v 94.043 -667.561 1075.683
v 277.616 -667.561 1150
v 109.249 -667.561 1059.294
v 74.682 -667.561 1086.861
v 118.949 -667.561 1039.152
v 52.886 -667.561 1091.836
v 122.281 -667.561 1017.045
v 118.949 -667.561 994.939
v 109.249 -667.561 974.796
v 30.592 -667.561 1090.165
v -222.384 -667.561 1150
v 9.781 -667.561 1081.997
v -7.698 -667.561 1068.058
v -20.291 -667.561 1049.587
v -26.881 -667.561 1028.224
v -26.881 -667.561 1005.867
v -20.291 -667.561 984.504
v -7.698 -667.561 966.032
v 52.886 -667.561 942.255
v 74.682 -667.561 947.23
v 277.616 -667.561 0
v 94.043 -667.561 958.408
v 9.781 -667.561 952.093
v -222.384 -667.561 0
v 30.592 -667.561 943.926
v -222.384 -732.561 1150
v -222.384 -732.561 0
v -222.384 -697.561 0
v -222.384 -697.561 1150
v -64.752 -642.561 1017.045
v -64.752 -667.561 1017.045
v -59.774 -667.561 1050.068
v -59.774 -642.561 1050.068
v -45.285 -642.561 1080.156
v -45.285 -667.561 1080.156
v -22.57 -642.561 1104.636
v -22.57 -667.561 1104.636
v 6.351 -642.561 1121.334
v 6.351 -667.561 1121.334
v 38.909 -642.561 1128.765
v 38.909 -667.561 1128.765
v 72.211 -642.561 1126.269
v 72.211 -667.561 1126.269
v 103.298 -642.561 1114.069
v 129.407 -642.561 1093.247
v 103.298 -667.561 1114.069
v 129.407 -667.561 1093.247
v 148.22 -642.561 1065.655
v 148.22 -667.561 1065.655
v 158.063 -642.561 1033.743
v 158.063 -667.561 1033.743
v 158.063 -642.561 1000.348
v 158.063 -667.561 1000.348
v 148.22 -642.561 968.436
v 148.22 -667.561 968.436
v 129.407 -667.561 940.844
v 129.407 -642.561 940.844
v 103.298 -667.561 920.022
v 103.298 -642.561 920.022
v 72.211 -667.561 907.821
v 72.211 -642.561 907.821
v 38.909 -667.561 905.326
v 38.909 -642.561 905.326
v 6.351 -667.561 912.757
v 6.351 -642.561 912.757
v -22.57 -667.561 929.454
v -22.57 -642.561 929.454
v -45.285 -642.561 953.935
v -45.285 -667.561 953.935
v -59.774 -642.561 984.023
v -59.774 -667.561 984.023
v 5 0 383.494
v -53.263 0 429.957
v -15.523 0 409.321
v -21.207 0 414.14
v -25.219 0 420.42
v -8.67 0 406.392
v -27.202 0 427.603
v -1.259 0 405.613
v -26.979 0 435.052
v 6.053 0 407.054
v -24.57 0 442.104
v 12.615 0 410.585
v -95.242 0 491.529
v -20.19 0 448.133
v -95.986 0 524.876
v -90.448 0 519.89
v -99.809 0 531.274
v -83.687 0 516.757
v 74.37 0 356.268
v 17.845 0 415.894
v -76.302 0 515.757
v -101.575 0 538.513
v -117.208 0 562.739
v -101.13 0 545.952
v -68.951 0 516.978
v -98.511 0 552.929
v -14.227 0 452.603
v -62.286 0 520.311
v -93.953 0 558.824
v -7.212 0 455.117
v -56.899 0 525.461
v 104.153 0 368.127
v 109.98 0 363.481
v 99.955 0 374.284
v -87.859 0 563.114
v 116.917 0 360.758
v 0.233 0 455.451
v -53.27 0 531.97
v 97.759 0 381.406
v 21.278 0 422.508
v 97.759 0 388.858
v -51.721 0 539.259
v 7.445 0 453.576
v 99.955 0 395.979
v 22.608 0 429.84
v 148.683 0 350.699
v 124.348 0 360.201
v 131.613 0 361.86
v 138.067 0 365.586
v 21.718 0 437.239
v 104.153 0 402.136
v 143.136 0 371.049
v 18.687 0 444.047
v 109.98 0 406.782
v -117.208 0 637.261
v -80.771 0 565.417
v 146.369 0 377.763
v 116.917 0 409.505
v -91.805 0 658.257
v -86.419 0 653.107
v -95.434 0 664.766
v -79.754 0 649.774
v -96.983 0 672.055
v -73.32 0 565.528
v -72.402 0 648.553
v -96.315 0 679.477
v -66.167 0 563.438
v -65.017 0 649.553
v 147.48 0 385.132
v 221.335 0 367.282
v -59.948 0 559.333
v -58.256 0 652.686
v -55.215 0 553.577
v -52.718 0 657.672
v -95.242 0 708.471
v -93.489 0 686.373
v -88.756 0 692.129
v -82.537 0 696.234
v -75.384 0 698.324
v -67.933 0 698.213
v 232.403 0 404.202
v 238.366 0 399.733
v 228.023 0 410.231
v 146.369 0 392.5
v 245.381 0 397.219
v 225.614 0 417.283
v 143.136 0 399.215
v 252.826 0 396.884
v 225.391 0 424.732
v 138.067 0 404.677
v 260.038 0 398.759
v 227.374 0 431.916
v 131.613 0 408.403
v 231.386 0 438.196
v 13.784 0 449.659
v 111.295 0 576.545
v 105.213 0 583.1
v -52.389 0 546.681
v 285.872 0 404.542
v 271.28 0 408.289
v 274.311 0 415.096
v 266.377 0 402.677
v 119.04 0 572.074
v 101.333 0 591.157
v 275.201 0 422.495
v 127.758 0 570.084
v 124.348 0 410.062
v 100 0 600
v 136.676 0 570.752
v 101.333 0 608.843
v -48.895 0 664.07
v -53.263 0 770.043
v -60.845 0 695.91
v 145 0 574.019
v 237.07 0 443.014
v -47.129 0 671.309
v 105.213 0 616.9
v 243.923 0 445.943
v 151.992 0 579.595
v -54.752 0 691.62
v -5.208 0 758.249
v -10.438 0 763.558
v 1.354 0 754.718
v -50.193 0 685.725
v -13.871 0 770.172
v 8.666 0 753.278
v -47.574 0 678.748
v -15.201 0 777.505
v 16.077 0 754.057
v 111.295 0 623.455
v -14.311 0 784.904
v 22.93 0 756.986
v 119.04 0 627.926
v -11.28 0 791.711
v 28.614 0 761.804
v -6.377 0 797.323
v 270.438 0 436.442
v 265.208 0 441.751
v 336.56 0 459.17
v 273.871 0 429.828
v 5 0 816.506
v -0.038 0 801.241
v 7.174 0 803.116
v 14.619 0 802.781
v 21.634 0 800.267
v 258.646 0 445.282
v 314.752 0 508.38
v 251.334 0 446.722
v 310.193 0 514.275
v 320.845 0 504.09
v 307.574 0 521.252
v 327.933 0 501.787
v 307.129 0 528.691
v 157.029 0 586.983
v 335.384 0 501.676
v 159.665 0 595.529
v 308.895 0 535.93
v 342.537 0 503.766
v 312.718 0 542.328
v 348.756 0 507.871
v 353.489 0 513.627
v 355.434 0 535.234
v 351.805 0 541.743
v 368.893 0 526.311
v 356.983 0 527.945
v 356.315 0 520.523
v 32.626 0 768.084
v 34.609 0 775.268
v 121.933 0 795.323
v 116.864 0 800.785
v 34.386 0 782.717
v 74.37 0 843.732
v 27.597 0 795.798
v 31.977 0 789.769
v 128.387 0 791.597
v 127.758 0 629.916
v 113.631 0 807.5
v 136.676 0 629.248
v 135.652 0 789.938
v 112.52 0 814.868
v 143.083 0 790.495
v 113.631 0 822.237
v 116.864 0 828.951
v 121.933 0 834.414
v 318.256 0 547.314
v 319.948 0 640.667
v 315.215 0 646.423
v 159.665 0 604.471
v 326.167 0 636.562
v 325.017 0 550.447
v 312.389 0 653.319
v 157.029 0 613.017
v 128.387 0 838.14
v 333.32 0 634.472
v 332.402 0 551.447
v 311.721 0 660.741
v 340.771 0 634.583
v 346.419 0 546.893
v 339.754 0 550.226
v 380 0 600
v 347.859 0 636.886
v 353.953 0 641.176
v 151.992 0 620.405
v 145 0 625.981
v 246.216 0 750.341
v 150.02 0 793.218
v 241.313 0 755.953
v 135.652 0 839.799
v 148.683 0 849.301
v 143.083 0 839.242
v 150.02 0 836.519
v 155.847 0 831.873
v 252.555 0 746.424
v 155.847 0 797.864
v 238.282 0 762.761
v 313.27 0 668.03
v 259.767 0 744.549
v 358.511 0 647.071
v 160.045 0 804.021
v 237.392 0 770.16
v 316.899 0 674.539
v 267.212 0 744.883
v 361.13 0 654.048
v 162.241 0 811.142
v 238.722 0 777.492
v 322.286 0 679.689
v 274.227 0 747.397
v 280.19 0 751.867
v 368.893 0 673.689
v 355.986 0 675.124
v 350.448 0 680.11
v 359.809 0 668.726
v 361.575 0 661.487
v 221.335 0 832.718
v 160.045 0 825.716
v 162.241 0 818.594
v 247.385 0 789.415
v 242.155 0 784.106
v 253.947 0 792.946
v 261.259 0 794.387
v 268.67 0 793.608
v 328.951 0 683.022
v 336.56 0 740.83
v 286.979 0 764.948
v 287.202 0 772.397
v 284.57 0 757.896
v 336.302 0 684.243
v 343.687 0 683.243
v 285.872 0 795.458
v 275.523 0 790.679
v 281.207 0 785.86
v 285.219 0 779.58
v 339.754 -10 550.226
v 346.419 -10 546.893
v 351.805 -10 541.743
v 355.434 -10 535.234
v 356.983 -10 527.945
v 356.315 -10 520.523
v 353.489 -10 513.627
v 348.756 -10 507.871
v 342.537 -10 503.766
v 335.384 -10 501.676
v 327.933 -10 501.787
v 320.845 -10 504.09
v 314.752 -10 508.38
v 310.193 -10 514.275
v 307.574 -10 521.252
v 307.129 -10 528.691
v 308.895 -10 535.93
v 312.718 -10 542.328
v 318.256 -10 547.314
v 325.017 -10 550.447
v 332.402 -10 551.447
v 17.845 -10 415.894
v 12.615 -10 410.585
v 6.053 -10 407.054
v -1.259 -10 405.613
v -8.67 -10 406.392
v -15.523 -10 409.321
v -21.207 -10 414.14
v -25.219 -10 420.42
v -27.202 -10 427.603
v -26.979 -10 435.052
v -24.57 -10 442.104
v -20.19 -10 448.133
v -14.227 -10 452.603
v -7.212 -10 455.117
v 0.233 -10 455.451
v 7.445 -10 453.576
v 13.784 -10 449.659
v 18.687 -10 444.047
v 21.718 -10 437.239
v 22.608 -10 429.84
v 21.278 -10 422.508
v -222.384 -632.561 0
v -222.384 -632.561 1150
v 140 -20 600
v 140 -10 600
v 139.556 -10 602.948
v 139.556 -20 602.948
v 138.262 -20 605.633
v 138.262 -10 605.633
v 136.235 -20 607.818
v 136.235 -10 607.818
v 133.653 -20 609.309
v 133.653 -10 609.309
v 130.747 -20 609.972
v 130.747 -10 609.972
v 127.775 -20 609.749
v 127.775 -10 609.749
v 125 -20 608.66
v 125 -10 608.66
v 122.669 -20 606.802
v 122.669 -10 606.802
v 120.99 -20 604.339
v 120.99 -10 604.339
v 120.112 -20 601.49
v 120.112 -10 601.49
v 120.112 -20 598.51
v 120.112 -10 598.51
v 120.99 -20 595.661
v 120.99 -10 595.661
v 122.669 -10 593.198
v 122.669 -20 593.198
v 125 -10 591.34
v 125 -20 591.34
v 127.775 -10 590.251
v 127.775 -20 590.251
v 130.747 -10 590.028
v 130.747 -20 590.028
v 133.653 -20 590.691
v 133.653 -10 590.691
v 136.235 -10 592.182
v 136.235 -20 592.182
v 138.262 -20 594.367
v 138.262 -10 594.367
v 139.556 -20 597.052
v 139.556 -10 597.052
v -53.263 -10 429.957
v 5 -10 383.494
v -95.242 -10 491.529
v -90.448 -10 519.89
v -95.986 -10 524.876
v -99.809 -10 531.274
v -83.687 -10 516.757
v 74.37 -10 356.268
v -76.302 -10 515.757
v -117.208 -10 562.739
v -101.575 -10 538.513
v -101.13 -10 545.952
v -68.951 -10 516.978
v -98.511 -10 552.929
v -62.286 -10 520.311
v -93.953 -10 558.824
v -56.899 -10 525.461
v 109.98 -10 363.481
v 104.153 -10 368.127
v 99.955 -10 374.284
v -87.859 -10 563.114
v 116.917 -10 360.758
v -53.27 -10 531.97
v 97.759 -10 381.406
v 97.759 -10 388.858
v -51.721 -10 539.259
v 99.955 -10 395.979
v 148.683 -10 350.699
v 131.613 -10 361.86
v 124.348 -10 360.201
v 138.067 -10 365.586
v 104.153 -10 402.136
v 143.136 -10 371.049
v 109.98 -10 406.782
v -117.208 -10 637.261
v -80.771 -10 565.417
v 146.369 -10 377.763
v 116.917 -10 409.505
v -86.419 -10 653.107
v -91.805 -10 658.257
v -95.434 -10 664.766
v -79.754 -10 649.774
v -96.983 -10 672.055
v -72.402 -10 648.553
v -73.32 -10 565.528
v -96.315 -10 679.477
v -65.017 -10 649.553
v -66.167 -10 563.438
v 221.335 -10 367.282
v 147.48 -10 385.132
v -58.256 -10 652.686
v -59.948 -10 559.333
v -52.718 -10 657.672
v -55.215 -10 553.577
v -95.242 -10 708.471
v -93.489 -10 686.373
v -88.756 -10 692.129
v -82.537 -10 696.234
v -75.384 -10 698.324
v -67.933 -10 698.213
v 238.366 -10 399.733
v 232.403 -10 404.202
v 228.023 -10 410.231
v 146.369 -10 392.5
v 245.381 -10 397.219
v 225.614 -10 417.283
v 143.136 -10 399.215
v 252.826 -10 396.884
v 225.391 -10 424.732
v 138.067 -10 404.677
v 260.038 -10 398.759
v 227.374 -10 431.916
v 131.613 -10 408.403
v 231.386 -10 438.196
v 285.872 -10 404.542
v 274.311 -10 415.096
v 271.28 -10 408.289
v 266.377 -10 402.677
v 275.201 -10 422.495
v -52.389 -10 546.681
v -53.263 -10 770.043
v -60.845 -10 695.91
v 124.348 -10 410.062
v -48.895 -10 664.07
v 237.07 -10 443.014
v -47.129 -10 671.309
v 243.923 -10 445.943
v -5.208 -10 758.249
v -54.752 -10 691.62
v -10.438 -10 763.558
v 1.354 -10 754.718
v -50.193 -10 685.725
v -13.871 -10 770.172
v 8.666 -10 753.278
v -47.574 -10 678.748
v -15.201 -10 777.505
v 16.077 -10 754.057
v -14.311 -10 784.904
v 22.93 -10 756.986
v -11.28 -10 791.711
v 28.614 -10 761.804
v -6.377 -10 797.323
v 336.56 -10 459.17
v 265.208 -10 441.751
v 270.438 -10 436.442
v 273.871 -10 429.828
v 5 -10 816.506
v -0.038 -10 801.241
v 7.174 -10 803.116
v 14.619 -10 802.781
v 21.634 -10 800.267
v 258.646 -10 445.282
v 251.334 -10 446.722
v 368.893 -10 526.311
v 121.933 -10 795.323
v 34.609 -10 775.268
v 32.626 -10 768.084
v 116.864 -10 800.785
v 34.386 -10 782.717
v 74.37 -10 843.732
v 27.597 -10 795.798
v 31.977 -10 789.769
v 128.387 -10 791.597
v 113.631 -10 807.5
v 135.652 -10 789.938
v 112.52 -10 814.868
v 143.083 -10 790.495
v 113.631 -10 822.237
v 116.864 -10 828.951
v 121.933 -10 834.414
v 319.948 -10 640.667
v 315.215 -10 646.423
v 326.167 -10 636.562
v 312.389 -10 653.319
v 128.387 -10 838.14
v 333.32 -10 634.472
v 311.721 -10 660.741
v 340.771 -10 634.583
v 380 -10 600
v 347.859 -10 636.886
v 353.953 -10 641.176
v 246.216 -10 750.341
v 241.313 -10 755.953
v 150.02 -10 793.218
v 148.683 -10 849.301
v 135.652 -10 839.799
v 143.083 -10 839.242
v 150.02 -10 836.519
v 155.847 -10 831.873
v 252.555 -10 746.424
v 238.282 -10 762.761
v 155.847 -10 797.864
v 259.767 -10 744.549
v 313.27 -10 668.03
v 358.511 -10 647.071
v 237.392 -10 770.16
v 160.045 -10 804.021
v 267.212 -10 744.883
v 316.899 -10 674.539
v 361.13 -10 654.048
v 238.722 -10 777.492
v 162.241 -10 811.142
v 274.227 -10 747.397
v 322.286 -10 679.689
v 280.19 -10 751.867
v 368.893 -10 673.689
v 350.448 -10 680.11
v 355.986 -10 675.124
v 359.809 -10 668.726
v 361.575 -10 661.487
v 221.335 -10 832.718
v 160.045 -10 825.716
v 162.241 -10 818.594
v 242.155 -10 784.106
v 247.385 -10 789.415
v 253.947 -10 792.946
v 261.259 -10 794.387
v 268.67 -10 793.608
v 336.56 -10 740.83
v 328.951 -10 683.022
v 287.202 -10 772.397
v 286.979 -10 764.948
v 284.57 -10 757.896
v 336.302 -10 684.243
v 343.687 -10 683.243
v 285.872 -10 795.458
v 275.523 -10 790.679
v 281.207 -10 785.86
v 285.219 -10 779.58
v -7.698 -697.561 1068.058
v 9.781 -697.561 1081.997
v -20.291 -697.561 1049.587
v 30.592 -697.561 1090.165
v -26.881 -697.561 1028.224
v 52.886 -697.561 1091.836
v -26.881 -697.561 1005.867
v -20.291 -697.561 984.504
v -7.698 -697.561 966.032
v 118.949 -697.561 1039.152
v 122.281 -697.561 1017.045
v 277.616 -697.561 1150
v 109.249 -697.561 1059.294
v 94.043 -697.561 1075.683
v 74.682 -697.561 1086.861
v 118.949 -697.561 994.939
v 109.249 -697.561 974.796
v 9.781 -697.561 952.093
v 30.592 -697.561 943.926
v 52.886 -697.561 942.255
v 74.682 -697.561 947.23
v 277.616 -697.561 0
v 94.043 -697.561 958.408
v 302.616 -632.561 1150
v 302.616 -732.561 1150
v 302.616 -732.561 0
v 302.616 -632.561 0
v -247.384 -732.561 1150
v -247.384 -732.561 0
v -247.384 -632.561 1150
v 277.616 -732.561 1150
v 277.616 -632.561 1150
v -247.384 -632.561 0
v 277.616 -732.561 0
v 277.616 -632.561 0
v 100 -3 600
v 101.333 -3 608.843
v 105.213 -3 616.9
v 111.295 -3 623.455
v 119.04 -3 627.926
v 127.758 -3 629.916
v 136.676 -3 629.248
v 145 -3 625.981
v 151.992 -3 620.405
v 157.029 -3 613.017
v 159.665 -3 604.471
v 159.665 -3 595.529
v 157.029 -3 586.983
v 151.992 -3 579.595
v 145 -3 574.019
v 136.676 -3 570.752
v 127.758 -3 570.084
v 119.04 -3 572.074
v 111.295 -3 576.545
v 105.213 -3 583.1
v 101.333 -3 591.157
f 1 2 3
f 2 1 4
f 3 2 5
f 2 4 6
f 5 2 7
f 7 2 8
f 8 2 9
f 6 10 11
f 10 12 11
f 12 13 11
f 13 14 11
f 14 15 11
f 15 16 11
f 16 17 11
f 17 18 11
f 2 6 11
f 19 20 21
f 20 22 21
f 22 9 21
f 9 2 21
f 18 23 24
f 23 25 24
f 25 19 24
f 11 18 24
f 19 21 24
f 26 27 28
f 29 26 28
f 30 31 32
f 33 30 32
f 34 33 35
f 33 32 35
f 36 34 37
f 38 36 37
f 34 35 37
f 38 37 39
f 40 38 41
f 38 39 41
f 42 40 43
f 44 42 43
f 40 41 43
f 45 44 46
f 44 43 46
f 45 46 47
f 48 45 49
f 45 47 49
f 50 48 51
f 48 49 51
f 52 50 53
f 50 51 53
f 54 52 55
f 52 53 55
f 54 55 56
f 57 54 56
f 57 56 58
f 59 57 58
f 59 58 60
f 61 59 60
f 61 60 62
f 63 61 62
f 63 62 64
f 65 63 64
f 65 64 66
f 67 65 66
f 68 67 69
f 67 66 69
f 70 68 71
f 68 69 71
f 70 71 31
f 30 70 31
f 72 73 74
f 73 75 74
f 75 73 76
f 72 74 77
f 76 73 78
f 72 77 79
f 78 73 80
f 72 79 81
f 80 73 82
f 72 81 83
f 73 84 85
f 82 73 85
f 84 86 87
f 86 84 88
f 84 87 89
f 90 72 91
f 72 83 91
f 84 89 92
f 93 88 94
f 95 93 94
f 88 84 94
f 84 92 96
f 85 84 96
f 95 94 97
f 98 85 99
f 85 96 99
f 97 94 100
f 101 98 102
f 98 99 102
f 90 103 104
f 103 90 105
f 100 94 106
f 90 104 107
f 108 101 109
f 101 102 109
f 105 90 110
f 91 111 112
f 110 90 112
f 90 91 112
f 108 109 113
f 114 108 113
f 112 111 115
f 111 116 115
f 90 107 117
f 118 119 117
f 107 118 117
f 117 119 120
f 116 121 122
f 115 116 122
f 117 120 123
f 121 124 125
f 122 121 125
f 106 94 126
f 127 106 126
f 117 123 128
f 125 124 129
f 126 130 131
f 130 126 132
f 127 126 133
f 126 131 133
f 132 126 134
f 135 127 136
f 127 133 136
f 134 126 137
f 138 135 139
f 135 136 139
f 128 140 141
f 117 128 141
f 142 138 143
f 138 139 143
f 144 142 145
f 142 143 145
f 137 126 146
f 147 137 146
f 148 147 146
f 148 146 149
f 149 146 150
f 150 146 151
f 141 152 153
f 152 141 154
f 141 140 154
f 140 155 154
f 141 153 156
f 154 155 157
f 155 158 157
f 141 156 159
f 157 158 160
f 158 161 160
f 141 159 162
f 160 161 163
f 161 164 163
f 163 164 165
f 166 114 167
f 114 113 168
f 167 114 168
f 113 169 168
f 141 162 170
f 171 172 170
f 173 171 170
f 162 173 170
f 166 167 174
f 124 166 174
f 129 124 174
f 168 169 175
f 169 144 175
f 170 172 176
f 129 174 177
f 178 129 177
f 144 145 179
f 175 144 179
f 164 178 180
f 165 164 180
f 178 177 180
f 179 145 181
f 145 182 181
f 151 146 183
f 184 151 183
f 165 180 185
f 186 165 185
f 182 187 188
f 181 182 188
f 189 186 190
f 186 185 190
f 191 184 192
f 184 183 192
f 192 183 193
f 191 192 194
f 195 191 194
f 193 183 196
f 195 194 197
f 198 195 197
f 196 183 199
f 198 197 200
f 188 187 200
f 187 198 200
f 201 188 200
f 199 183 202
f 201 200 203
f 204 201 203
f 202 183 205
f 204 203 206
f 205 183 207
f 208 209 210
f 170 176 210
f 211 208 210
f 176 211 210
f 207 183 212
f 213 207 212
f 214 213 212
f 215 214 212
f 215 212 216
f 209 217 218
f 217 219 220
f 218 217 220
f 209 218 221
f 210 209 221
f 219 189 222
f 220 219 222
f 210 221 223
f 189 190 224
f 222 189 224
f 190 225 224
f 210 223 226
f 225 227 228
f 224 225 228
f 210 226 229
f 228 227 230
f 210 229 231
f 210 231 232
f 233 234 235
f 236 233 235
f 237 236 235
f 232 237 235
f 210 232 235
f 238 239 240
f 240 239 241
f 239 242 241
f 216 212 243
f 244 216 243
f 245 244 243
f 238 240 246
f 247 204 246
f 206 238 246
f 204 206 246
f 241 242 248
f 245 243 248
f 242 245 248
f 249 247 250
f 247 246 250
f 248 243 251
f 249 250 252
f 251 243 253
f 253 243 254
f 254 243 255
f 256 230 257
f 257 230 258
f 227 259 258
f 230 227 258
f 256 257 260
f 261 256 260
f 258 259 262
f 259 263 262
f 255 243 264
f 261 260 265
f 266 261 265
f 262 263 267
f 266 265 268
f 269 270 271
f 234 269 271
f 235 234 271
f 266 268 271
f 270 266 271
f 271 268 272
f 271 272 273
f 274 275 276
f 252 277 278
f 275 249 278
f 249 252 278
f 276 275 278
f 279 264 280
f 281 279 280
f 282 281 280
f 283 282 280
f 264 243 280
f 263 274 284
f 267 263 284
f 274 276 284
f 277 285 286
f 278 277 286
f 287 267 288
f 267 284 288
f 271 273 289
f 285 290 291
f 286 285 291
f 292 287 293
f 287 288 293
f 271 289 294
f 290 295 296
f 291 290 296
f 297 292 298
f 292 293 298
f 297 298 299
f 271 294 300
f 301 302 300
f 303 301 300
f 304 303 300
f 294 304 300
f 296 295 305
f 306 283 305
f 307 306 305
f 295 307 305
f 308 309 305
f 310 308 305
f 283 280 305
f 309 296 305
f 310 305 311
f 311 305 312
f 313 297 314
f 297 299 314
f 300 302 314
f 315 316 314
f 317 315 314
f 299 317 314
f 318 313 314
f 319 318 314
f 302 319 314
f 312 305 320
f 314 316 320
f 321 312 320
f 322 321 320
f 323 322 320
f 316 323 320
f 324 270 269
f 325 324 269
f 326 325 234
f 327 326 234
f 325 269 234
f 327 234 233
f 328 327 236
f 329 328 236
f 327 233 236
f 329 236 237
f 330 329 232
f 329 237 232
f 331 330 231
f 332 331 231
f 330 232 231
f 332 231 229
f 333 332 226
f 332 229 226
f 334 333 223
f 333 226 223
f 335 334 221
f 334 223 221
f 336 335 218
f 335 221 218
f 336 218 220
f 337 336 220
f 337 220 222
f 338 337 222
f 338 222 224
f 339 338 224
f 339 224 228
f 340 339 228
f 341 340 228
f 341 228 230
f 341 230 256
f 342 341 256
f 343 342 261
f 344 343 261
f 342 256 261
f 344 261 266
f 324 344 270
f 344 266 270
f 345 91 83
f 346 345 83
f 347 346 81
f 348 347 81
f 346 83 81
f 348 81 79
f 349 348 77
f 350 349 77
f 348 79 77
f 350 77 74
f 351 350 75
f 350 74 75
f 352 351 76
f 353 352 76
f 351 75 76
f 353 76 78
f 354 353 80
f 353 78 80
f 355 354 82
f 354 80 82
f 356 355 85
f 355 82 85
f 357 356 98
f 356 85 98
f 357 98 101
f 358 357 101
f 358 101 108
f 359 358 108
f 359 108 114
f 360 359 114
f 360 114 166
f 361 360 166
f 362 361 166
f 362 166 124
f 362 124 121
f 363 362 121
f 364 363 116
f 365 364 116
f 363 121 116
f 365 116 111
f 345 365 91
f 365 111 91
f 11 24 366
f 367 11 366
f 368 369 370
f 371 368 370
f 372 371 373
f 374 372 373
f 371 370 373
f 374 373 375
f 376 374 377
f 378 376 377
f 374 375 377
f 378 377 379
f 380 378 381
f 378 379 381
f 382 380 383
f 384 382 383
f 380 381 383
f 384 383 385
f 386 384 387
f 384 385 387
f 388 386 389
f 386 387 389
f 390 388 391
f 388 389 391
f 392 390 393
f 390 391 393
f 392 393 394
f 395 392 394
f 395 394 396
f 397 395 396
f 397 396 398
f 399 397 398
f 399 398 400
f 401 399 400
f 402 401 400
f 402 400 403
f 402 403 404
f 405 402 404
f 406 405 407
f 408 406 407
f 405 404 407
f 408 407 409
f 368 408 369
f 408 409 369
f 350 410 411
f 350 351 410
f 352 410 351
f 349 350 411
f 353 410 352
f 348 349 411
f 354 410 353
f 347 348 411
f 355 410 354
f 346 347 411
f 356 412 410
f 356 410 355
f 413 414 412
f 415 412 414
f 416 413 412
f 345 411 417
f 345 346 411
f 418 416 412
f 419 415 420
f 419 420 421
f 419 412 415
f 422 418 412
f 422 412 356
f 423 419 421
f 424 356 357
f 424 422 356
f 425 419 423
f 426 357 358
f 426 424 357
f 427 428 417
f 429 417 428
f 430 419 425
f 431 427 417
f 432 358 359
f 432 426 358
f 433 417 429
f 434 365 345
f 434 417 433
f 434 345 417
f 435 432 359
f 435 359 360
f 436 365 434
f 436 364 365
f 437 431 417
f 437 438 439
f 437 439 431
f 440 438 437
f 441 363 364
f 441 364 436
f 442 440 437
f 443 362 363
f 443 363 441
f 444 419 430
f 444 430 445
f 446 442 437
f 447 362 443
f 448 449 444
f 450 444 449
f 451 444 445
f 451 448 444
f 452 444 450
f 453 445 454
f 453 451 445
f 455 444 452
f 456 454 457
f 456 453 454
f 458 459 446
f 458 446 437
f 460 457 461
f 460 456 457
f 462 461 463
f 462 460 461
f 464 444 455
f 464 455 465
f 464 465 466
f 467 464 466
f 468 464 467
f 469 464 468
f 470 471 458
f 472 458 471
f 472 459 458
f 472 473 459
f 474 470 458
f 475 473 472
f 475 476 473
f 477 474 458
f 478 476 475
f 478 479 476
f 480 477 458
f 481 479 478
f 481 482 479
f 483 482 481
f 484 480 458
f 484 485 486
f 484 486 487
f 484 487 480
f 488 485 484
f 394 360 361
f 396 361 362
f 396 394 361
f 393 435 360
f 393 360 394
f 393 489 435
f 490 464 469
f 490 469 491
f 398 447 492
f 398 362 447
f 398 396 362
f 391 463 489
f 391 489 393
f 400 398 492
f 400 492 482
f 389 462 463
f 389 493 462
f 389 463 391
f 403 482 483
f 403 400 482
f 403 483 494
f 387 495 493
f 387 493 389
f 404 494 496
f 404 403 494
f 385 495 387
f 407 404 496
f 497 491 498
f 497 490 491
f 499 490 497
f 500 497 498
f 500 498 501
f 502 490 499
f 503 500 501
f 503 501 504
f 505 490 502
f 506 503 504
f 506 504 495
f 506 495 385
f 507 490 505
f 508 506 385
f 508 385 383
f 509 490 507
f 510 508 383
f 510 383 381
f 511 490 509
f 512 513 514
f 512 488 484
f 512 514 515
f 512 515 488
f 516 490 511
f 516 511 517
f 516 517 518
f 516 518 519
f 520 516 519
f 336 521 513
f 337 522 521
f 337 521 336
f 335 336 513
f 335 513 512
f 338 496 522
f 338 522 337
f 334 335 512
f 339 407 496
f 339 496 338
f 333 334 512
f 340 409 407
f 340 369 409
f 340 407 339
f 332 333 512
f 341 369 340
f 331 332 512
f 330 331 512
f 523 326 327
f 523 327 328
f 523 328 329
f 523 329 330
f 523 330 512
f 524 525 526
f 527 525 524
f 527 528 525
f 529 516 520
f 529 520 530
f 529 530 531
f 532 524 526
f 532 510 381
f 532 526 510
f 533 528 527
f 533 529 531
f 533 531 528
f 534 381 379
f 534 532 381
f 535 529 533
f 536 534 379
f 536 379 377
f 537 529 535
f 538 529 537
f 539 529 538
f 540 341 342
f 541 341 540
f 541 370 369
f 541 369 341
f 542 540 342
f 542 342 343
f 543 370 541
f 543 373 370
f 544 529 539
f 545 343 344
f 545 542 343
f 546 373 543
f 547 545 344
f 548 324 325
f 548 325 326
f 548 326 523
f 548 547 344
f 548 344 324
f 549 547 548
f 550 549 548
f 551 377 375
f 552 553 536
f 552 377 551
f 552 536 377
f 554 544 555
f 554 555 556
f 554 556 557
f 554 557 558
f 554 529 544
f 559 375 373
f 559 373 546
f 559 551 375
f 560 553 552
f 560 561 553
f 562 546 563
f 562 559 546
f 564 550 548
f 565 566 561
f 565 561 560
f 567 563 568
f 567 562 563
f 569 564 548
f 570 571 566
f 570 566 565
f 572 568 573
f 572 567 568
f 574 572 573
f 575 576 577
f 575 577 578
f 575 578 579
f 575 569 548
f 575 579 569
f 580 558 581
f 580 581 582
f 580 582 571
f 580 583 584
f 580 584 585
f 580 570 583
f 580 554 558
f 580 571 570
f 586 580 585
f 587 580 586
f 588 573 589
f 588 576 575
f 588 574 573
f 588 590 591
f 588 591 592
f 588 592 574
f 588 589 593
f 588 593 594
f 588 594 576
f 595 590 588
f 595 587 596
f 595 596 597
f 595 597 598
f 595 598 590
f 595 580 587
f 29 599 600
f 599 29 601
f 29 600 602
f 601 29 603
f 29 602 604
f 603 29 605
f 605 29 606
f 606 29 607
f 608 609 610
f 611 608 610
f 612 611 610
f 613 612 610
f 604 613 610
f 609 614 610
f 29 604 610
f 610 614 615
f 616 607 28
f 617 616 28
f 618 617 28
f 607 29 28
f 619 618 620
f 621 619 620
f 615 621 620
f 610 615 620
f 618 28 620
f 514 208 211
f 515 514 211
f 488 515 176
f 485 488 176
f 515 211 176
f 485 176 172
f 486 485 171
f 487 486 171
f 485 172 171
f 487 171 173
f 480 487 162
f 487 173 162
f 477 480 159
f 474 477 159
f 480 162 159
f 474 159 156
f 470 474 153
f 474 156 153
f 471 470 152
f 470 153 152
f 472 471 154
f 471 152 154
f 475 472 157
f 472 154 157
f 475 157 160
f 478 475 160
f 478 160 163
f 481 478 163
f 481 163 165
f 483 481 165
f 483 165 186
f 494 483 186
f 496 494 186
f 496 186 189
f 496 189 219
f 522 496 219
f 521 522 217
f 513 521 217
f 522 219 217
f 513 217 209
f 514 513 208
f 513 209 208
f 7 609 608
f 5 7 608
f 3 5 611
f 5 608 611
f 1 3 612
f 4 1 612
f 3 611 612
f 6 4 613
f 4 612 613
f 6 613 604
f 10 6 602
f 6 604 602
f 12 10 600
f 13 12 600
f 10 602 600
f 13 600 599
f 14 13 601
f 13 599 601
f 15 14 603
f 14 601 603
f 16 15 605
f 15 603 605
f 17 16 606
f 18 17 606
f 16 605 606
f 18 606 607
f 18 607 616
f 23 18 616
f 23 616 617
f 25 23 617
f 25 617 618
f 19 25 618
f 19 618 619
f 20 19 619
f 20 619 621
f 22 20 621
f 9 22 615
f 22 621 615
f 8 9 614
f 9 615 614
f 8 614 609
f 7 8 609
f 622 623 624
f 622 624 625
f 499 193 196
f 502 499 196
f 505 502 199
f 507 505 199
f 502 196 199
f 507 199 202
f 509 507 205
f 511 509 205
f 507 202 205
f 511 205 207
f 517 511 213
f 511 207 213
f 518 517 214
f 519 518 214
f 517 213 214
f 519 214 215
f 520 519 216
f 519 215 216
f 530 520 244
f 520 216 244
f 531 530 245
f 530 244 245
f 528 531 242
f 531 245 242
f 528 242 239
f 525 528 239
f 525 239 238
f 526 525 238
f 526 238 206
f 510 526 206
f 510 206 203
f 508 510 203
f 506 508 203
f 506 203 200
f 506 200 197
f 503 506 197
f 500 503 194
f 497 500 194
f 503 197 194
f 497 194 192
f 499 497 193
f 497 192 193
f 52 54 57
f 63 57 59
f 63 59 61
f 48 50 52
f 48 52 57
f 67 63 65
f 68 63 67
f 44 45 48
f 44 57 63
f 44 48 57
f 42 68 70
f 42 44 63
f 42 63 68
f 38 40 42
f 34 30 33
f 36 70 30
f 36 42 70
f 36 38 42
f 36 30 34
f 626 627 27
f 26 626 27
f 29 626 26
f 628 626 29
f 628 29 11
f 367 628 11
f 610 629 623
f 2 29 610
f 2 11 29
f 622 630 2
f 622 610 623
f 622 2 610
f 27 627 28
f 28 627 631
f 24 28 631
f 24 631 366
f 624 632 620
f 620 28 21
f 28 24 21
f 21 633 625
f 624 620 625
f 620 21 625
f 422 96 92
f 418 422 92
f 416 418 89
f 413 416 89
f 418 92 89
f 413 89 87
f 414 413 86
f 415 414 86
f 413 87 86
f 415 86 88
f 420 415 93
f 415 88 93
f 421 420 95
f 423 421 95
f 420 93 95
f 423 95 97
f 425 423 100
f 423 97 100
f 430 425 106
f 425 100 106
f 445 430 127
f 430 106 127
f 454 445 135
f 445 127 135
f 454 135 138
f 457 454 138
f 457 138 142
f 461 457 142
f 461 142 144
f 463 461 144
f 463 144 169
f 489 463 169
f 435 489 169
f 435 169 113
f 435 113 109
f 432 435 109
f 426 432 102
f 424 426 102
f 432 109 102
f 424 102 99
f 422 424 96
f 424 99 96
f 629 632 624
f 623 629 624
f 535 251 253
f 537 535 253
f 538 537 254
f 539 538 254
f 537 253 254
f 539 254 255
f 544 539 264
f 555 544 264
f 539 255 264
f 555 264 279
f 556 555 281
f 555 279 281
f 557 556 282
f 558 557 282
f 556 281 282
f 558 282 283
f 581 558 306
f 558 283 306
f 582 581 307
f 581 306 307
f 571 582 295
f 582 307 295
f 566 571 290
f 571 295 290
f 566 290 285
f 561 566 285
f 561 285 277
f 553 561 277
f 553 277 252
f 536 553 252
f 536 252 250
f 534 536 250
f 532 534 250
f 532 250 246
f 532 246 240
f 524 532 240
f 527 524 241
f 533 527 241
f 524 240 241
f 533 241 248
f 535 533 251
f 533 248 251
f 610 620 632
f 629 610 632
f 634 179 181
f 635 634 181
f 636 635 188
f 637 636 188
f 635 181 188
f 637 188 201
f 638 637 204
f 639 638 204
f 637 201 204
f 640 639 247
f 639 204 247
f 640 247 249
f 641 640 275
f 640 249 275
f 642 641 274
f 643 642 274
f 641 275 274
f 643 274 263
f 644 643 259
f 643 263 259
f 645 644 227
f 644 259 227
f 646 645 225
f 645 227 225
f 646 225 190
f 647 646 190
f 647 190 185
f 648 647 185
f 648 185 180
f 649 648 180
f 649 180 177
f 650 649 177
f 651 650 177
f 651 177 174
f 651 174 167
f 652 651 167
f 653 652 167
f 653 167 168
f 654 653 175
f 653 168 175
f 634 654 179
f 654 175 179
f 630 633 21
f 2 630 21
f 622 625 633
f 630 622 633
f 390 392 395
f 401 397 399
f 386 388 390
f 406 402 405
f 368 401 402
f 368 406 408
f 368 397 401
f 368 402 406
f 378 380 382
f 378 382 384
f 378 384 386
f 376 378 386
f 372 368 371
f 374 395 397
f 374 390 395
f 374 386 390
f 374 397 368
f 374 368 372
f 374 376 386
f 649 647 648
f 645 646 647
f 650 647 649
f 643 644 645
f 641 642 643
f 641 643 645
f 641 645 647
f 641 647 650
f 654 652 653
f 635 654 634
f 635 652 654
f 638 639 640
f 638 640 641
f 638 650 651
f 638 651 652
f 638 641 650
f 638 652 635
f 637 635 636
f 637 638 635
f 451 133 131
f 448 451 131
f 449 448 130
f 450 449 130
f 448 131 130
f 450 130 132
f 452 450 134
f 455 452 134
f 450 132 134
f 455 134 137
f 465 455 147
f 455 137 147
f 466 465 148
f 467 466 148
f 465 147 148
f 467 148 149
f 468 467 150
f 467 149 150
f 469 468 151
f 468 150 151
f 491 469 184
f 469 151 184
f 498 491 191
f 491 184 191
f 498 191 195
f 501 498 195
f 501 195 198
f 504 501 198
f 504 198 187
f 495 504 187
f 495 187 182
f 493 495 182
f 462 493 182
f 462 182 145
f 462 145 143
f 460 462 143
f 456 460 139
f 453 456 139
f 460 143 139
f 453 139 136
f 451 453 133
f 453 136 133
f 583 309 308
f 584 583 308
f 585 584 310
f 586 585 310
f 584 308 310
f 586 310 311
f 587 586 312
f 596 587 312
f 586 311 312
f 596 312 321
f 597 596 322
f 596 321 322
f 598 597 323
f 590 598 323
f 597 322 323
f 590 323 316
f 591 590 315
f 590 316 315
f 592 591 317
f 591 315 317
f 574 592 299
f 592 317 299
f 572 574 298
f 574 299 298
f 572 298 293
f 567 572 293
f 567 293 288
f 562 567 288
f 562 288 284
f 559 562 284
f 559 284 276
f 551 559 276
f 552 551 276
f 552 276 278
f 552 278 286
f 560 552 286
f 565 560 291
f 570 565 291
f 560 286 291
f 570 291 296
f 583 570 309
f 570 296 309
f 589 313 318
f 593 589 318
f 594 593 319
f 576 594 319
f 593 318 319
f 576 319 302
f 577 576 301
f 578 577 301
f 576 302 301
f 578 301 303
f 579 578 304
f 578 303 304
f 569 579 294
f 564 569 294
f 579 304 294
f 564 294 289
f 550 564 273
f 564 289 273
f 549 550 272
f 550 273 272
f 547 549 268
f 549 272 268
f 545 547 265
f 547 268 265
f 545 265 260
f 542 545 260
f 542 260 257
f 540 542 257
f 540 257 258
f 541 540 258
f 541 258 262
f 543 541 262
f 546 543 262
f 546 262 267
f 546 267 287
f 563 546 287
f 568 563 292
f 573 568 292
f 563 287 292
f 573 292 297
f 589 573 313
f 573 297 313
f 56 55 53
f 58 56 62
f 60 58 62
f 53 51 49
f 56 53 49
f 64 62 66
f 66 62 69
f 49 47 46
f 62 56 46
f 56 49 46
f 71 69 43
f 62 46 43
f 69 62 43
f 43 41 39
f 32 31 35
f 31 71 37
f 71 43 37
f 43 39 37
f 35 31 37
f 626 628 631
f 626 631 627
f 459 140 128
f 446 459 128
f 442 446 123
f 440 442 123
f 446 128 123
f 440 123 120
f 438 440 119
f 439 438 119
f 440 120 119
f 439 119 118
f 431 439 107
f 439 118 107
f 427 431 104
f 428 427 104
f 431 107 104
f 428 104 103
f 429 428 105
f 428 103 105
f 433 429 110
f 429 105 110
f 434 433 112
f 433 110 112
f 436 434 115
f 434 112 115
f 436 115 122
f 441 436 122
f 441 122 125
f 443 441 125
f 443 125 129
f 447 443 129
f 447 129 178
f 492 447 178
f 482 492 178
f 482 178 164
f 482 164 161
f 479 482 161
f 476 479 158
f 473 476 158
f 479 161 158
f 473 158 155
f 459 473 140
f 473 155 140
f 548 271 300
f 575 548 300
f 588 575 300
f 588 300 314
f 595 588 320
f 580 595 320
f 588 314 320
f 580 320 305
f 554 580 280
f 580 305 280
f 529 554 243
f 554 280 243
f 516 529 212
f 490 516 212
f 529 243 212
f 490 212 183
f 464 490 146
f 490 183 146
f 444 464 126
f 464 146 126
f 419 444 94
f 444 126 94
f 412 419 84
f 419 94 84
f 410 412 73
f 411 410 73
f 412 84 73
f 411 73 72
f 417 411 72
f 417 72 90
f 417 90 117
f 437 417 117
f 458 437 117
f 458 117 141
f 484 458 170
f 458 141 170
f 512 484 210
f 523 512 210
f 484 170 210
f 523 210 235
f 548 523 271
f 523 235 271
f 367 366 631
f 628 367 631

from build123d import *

# Parameters (mm, degrees)
F0_R            = 250
F1_DEPTH        = 10
F3_R            = 10
F4_DEPTH        = 10
F5_R            = 30
F6_DEPTH        = 3
F2_R            = 25
F7_DEPTH        = 10
F7_COPIES_COUNT = 10
F9_DEPTH        = 1150
F10_R           = 75
F11_DEPTH       = 30
F12_R           = 112.0330230735
F13_DEPTH       = 25


# Not quite as in the source:
# - a pattern or mirror of a feature is missing from the dataset's text; its kind, count and spacing are read off the source's solid


with BuildPart() as f1:
    # F0 (on Front) → F1 (new body)
    with BuildSketch(Plane.XZ):
        with Locations((130, 600)):
            Circle(F0_R)
    extrude(amount=F1_DEPTH)

    # F3 (on face) → F4 (join)
    with BuildSketch(Plane.XZ.offset(10)):
        with Locations((130, 600)):
            Circle(F3_R)
    extrude(amount=F4_DEPTH)

    # F5 (on face) → F6 (cut)
    with BuildSketch(Plane(origin=(0, 0, 0), x_dir=(-1, 0, 0), z_dir=(0, 1, 0))):
        with Locations((-130, 600)):
            Circle(F5_R)
    extrude(amount=-F6_DEPTH, mode=Mode.SUBTRACT)

    # F2 (on face) → F7 (cut, through all)
    with BuildSketch(Plane(origin=(0, 0, 0), x_dir=(-1, 0, 0), z_dir=(0, 1, 0))):
        with Locations((-137.5204109389, 814.8684328125)):
            Circle(F2_R)
    f7 = extrude(amount=-F7_DEPTH, mode=Mode.SUBTRACT)

    # F7_copies: F7 ×10 about axis
    f7_copies_axis = Axis((130, 0, 600), (0, 1, 0))
    for i in range(1, F7_COPIES_COUNT):
        add(f7.rotate(f7_copies_axis, i * 360 / F7_COPIES_COUNT), mode=Mode.SUBTRACT)


with BuildPart() as f9:
    # F8 (on Top) → F9 (new body)
    with BuildSketch(Plane.XY):
        Polygon((-222.3836738983, -632.5608144519), (-247.3836738983, -632.5608144519), (-247.3836738983, -732.5608144519), (-222.3836738983, -732.5608144519), (-222.3836738983, -697.5608144519), (277.6163261017, -697.5608144519), (277.6163261017, -732.5608144519), (302.6163261017, -732.5608144519), (302.6163261017, -632.5608144519), (277.6163261017, -632.5608144519), (277.6163261017, -667.5608144519), (-222.3836738983, -667.5608144519), align=None)
    extrude(amount=F9_DEPTH)

    # F10 (on face) → F11 (cut, through all)
    with BuildSketch(Plane.XZ.offset(697.5608144519)):
        with Locations((47.2812950611, 1017.045378685)):
            Circle(F10_R)
    extrude(amount=-F11_DEPTH, mode=Mode.SUBTRACT)


with BuildPart() as f13:
    # F12 (on face) → F13 (new body)
    with BuildSketch(Plane(origin=(0, -667.5608144519, 0), x_dir=(-1, 0, 0), z_dir=(0, 1, 0))):
        with Locations((-47.2812950611, 1017.045378685)):
            Circle(F12_R)
    extrude(amount=F13_DEPTH)


solid = Compound([f1.part, f9.part, f13.part])
